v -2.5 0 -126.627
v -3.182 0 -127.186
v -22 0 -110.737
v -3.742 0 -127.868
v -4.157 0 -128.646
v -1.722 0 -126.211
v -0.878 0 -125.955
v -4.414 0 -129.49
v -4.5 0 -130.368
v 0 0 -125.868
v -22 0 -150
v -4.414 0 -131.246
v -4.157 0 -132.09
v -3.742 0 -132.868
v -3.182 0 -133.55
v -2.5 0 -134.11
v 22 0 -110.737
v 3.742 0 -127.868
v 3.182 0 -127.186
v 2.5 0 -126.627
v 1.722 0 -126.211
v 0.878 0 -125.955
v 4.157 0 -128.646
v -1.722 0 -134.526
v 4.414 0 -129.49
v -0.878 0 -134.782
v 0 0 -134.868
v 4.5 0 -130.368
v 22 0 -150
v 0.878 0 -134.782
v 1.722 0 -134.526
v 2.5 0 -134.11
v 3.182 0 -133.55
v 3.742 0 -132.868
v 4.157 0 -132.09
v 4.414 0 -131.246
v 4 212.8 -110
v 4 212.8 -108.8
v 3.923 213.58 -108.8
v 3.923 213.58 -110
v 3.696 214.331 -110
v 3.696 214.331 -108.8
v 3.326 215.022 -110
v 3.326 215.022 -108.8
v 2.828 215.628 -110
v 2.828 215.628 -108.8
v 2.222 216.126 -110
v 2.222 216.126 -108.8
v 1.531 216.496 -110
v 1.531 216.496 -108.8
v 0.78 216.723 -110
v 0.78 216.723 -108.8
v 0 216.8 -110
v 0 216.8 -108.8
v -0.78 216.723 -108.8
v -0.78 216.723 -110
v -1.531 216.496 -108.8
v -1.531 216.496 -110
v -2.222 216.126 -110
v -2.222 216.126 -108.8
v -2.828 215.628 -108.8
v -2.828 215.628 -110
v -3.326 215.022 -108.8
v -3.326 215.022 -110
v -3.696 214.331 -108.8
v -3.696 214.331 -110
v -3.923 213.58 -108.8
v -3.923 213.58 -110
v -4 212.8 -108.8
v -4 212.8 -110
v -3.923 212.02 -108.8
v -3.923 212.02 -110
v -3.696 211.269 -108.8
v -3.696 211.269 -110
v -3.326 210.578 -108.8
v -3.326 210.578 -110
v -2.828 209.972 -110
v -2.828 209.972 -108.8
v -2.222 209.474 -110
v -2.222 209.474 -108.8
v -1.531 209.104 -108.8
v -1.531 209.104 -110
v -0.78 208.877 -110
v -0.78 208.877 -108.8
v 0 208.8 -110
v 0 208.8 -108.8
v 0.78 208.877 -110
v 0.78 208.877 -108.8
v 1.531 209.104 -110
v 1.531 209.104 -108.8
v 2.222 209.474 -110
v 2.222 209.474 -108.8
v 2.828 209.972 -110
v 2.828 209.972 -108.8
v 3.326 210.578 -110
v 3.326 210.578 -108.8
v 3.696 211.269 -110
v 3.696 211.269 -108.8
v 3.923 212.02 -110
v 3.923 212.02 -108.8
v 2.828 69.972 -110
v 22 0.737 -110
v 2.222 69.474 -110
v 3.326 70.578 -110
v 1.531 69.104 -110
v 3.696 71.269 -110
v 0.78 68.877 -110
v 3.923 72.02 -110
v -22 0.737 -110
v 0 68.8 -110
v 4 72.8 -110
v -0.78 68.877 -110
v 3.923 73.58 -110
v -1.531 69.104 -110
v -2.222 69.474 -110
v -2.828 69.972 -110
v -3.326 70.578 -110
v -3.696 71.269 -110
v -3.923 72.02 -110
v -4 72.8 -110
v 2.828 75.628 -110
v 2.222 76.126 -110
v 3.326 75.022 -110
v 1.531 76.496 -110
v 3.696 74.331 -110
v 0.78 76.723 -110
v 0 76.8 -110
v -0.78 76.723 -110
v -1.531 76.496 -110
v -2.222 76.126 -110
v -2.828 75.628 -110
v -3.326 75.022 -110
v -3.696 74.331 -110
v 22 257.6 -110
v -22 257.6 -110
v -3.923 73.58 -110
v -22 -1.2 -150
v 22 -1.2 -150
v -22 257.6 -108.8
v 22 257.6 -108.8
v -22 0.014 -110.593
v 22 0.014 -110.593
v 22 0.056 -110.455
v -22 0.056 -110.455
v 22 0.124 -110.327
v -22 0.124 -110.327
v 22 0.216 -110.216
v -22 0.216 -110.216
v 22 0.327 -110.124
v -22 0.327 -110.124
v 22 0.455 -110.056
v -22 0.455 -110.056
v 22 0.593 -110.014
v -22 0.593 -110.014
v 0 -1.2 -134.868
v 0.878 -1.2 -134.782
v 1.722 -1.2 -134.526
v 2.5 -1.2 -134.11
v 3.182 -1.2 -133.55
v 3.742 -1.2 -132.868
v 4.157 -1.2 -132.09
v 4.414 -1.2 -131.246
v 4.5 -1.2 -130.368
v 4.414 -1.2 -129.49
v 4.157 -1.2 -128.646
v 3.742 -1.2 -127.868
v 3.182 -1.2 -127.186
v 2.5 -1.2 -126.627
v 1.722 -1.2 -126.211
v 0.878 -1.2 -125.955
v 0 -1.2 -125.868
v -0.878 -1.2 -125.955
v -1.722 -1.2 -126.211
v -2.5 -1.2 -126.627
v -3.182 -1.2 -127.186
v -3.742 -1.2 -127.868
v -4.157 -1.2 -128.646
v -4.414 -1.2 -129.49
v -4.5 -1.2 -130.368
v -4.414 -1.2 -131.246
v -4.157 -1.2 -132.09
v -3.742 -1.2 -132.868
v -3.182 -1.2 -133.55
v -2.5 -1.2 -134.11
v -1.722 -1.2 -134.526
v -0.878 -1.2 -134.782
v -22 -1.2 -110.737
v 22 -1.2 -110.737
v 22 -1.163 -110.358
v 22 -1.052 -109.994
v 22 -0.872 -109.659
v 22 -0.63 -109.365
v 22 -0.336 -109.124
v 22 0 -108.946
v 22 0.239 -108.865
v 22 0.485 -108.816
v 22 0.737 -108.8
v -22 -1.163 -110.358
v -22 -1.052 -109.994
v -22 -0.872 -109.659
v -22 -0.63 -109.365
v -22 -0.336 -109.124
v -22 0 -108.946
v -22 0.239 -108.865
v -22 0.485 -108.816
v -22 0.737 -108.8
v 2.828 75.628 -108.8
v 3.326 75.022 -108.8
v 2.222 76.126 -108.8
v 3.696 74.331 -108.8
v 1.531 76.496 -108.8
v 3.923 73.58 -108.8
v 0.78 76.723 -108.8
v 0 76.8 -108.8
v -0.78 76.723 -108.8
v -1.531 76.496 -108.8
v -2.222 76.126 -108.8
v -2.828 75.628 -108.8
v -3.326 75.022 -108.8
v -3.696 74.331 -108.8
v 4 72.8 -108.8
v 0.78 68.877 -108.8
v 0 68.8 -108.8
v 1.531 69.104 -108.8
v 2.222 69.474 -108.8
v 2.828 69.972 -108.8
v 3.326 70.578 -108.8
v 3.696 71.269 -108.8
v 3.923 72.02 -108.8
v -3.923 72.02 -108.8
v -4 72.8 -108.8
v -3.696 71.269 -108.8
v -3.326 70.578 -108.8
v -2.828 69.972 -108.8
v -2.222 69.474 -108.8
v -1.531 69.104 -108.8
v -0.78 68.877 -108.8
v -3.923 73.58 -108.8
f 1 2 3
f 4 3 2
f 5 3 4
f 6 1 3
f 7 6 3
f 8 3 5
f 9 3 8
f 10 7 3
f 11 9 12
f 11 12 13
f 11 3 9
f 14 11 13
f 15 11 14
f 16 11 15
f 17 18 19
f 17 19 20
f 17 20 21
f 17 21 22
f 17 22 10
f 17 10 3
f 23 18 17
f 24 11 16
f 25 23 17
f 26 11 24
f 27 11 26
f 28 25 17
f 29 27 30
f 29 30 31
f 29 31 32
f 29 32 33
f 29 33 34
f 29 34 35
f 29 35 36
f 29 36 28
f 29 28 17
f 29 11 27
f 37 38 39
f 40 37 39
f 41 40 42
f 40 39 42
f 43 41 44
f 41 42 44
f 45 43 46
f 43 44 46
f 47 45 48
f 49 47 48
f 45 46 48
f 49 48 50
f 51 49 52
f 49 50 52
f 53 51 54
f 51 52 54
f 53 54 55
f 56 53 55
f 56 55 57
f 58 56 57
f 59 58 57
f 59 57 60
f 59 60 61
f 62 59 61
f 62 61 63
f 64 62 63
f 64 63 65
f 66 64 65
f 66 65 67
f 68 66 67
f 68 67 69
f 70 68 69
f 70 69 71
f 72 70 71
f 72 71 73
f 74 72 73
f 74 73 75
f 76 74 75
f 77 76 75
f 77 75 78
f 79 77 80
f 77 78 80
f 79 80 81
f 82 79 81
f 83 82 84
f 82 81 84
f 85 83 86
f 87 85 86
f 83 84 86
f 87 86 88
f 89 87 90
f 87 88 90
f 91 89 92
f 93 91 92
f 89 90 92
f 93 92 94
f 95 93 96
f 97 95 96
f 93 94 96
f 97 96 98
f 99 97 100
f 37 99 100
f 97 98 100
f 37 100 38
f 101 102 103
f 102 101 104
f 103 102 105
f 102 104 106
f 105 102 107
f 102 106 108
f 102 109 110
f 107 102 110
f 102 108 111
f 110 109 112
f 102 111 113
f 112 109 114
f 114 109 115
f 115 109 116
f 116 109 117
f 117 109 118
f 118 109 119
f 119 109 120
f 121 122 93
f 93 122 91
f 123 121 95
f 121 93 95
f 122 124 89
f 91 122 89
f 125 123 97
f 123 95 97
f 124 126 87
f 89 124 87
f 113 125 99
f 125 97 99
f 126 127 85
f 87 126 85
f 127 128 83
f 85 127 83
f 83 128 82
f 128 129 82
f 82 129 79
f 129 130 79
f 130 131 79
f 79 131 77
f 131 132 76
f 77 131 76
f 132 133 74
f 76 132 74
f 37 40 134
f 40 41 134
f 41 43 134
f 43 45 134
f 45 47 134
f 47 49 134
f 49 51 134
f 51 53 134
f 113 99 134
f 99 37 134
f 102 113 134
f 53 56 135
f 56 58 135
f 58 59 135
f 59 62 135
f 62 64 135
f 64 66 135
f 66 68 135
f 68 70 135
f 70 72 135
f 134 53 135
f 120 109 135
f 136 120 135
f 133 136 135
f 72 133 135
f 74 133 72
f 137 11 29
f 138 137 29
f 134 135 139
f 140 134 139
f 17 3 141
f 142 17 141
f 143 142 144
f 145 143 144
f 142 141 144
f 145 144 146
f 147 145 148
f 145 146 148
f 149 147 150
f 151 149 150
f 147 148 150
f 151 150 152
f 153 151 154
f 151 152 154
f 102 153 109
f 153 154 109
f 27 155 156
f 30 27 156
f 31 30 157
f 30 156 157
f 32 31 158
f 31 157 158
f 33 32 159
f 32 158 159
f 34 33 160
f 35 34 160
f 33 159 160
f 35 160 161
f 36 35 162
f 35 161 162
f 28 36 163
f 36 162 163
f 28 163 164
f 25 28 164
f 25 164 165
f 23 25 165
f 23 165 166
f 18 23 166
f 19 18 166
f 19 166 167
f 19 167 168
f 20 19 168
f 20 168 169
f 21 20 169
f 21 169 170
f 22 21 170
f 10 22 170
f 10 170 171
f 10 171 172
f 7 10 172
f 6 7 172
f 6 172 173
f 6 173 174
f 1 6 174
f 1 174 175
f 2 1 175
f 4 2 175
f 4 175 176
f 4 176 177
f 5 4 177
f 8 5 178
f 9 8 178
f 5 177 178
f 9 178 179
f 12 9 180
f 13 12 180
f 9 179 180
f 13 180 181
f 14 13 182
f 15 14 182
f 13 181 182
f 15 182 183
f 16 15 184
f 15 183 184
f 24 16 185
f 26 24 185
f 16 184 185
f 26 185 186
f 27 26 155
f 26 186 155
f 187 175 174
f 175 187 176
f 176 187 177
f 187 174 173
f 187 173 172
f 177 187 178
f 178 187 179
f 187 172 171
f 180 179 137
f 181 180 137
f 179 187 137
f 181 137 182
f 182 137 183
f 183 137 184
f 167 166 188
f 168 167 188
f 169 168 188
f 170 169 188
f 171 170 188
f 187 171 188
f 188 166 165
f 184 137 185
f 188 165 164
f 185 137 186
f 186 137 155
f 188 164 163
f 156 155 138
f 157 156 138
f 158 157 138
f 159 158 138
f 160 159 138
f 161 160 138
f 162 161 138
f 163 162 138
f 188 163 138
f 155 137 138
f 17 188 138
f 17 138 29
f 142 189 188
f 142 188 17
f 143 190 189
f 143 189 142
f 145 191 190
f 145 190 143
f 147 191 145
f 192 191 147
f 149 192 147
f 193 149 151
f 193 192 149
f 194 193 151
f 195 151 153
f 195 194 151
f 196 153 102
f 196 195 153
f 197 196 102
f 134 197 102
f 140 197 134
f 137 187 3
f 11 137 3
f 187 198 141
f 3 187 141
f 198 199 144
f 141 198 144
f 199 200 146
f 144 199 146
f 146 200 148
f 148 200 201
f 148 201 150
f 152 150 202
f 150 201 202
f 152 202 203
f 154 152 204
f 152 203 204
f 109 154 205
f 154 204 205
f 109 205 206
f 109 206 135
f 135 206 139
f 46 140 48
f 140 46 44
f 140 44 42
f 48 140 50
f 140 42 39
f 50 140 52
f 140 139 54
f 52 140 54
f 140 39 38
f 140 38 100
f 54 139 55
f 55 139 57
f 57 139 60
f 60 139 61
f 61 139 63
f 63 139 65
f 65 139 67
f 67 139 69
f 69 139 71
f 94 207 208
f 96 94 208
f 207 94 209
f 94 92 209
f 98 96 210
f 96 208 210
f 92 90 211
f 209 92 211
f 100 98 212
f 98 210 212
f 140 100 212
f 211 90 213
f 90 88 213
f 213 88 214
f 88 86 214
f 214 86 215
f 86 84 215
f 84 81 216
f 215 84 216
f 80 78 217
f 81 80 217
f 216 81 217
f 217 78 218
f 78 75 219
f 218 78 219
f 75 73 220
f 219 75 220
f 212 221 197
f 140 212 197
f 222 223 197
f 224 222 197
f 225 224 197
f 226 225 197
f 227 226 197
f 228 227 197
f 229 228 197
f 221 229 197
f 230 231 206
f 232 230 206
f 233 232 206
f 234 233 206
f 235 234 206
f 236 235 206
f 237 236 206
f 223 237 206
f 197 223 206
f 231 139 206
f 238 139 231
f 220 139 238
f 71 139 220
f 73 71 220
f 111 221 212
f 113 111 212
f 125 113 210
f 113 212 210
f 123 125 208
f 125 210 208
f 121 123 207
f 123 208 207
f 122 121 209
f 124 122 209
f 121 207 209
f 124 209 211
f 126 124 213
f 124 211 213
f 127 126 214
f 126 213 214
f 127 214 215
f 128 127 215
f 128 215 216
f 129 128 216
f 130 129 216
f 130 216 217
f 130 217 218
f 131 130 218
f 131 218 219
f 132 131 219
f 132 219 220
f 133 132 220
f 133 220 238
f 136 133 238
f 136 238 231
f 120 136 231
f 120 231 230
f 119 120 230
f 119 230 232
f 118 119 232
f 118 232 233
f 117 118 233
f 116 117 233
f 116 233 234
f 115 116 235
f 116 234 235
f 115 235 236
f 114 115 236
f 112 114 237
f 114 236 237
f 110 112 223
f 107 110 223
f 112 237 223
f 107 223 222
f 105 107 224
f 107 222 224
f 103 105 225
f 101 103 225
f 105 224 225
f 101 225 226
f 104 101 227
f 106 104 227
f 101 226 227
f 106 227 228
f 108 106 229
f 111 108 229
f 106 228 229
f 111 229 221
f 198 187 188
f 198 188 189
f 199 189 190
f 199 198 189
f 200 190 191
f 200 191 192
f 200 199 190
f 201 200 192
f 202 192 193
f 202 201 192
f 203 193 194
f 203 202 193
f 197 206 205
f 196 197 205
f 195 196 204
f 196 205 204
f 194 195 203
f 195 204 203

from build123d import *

# Parameters (mm, degrees)
SKETCH1_W              = 44
SKETCH1_H              = 300
BASE_FLANGE1_DEPTH     = 1.2
SKETCHED_START         = -22
SKETCHED_BEND1_DEPTH   = 44
SKETCHED_BEND1_2_DEPTH = 44
SKETCH7_R              = 4
CUT_EXTRUDE1_DEPTH     = 10
SKETCH9_R              = 4.5
CUT_EXTRUDE2_DEPTH     = 10


# Read off the part's stored shape, not the designer's step: Sketched Bend1
# Sheet-metal steps are written as plain solids
with BuildPart() as part:
    # Sketch1 → Base-Flange1 (new body)
    with BuildSketch(Plane(origin=(0, 0, 0), x_dir=(1, 0, 0), z_dir=(0, 1, 0))):
        Rectangle(SKETCH1_W, SKETCH1_H)
    extrude(amount=-BASE_FLANGE1_DEPTH)

    # Sketched Bend1 outline → Sketched Bend1 (cut)
    with BuildSketch(Plane.YZ.offset(SKETCHED_START)):
        with BuildLine():
            ThreePointArc((-1.2, -110.7366), (-0.872269031, -109.658657516), (0, -108.945555612))
            Line((0, -108.945555612), (0, 150))
            Line((0, 150), (-1.2, 150))
            Line((-1.2, 150), (-1.2, -110.7366))
        make_face()
    extrude(amount=SKETCHED_BEND1_DEPTH, mode=Mode.SUBTRACT)

    # Sketched Bend1 2 outline → Sketched Bend1 2 (add)
    with BuildSketch(Plane.YZ.offset(SKETCHED_START)):
        with BuildLine():
            Line((257.6, -110), (257.6, -108.8))
            Line((257.6, -108.8), (0.7366, -108.8))
            ThreePointArc((0.7366, -108.8), (0.361178238, -108.836737358), (0, -108.945555612))
            Line((0, -108.945555612), (0, -110.7366))
            ThreePointArc((0, -110.7366), (0.215745145, -110.215745145), (0.7366, -110))
            Line((0.7366, -110), (257.6, -110))
        make_face()
    extrude(amount=SKETCHED_BEND1_2_DEPTH)

    # Sketch7 → Cut-Extrude1 (cut)
    with BuildSketch(Plane.XY.offset(-108.8)):
        with Locations((0, 72.8)):
            Circle(SKETCH7_R)
        with Locations((0, 212.8)):
            Circle(SKETCH7_R)
    extrude(amount=-CUT_EXTRUDE1_DEPTH, mode=Mode.SUBTRACT)

    # Sketch9 → Cut-Extrude2 (cut)
    with BuildSketch(Plane.XZ.offset(1.2)):
        with Locations(Location((0, -130.3683, 0), (0, 0, 270))):
            Circle(SKETCH9_R)
    extrude(amount=-CUT_EXTRUDE2_DEPTH, mode=Mode.SUBTRACT)


solid = part.part
